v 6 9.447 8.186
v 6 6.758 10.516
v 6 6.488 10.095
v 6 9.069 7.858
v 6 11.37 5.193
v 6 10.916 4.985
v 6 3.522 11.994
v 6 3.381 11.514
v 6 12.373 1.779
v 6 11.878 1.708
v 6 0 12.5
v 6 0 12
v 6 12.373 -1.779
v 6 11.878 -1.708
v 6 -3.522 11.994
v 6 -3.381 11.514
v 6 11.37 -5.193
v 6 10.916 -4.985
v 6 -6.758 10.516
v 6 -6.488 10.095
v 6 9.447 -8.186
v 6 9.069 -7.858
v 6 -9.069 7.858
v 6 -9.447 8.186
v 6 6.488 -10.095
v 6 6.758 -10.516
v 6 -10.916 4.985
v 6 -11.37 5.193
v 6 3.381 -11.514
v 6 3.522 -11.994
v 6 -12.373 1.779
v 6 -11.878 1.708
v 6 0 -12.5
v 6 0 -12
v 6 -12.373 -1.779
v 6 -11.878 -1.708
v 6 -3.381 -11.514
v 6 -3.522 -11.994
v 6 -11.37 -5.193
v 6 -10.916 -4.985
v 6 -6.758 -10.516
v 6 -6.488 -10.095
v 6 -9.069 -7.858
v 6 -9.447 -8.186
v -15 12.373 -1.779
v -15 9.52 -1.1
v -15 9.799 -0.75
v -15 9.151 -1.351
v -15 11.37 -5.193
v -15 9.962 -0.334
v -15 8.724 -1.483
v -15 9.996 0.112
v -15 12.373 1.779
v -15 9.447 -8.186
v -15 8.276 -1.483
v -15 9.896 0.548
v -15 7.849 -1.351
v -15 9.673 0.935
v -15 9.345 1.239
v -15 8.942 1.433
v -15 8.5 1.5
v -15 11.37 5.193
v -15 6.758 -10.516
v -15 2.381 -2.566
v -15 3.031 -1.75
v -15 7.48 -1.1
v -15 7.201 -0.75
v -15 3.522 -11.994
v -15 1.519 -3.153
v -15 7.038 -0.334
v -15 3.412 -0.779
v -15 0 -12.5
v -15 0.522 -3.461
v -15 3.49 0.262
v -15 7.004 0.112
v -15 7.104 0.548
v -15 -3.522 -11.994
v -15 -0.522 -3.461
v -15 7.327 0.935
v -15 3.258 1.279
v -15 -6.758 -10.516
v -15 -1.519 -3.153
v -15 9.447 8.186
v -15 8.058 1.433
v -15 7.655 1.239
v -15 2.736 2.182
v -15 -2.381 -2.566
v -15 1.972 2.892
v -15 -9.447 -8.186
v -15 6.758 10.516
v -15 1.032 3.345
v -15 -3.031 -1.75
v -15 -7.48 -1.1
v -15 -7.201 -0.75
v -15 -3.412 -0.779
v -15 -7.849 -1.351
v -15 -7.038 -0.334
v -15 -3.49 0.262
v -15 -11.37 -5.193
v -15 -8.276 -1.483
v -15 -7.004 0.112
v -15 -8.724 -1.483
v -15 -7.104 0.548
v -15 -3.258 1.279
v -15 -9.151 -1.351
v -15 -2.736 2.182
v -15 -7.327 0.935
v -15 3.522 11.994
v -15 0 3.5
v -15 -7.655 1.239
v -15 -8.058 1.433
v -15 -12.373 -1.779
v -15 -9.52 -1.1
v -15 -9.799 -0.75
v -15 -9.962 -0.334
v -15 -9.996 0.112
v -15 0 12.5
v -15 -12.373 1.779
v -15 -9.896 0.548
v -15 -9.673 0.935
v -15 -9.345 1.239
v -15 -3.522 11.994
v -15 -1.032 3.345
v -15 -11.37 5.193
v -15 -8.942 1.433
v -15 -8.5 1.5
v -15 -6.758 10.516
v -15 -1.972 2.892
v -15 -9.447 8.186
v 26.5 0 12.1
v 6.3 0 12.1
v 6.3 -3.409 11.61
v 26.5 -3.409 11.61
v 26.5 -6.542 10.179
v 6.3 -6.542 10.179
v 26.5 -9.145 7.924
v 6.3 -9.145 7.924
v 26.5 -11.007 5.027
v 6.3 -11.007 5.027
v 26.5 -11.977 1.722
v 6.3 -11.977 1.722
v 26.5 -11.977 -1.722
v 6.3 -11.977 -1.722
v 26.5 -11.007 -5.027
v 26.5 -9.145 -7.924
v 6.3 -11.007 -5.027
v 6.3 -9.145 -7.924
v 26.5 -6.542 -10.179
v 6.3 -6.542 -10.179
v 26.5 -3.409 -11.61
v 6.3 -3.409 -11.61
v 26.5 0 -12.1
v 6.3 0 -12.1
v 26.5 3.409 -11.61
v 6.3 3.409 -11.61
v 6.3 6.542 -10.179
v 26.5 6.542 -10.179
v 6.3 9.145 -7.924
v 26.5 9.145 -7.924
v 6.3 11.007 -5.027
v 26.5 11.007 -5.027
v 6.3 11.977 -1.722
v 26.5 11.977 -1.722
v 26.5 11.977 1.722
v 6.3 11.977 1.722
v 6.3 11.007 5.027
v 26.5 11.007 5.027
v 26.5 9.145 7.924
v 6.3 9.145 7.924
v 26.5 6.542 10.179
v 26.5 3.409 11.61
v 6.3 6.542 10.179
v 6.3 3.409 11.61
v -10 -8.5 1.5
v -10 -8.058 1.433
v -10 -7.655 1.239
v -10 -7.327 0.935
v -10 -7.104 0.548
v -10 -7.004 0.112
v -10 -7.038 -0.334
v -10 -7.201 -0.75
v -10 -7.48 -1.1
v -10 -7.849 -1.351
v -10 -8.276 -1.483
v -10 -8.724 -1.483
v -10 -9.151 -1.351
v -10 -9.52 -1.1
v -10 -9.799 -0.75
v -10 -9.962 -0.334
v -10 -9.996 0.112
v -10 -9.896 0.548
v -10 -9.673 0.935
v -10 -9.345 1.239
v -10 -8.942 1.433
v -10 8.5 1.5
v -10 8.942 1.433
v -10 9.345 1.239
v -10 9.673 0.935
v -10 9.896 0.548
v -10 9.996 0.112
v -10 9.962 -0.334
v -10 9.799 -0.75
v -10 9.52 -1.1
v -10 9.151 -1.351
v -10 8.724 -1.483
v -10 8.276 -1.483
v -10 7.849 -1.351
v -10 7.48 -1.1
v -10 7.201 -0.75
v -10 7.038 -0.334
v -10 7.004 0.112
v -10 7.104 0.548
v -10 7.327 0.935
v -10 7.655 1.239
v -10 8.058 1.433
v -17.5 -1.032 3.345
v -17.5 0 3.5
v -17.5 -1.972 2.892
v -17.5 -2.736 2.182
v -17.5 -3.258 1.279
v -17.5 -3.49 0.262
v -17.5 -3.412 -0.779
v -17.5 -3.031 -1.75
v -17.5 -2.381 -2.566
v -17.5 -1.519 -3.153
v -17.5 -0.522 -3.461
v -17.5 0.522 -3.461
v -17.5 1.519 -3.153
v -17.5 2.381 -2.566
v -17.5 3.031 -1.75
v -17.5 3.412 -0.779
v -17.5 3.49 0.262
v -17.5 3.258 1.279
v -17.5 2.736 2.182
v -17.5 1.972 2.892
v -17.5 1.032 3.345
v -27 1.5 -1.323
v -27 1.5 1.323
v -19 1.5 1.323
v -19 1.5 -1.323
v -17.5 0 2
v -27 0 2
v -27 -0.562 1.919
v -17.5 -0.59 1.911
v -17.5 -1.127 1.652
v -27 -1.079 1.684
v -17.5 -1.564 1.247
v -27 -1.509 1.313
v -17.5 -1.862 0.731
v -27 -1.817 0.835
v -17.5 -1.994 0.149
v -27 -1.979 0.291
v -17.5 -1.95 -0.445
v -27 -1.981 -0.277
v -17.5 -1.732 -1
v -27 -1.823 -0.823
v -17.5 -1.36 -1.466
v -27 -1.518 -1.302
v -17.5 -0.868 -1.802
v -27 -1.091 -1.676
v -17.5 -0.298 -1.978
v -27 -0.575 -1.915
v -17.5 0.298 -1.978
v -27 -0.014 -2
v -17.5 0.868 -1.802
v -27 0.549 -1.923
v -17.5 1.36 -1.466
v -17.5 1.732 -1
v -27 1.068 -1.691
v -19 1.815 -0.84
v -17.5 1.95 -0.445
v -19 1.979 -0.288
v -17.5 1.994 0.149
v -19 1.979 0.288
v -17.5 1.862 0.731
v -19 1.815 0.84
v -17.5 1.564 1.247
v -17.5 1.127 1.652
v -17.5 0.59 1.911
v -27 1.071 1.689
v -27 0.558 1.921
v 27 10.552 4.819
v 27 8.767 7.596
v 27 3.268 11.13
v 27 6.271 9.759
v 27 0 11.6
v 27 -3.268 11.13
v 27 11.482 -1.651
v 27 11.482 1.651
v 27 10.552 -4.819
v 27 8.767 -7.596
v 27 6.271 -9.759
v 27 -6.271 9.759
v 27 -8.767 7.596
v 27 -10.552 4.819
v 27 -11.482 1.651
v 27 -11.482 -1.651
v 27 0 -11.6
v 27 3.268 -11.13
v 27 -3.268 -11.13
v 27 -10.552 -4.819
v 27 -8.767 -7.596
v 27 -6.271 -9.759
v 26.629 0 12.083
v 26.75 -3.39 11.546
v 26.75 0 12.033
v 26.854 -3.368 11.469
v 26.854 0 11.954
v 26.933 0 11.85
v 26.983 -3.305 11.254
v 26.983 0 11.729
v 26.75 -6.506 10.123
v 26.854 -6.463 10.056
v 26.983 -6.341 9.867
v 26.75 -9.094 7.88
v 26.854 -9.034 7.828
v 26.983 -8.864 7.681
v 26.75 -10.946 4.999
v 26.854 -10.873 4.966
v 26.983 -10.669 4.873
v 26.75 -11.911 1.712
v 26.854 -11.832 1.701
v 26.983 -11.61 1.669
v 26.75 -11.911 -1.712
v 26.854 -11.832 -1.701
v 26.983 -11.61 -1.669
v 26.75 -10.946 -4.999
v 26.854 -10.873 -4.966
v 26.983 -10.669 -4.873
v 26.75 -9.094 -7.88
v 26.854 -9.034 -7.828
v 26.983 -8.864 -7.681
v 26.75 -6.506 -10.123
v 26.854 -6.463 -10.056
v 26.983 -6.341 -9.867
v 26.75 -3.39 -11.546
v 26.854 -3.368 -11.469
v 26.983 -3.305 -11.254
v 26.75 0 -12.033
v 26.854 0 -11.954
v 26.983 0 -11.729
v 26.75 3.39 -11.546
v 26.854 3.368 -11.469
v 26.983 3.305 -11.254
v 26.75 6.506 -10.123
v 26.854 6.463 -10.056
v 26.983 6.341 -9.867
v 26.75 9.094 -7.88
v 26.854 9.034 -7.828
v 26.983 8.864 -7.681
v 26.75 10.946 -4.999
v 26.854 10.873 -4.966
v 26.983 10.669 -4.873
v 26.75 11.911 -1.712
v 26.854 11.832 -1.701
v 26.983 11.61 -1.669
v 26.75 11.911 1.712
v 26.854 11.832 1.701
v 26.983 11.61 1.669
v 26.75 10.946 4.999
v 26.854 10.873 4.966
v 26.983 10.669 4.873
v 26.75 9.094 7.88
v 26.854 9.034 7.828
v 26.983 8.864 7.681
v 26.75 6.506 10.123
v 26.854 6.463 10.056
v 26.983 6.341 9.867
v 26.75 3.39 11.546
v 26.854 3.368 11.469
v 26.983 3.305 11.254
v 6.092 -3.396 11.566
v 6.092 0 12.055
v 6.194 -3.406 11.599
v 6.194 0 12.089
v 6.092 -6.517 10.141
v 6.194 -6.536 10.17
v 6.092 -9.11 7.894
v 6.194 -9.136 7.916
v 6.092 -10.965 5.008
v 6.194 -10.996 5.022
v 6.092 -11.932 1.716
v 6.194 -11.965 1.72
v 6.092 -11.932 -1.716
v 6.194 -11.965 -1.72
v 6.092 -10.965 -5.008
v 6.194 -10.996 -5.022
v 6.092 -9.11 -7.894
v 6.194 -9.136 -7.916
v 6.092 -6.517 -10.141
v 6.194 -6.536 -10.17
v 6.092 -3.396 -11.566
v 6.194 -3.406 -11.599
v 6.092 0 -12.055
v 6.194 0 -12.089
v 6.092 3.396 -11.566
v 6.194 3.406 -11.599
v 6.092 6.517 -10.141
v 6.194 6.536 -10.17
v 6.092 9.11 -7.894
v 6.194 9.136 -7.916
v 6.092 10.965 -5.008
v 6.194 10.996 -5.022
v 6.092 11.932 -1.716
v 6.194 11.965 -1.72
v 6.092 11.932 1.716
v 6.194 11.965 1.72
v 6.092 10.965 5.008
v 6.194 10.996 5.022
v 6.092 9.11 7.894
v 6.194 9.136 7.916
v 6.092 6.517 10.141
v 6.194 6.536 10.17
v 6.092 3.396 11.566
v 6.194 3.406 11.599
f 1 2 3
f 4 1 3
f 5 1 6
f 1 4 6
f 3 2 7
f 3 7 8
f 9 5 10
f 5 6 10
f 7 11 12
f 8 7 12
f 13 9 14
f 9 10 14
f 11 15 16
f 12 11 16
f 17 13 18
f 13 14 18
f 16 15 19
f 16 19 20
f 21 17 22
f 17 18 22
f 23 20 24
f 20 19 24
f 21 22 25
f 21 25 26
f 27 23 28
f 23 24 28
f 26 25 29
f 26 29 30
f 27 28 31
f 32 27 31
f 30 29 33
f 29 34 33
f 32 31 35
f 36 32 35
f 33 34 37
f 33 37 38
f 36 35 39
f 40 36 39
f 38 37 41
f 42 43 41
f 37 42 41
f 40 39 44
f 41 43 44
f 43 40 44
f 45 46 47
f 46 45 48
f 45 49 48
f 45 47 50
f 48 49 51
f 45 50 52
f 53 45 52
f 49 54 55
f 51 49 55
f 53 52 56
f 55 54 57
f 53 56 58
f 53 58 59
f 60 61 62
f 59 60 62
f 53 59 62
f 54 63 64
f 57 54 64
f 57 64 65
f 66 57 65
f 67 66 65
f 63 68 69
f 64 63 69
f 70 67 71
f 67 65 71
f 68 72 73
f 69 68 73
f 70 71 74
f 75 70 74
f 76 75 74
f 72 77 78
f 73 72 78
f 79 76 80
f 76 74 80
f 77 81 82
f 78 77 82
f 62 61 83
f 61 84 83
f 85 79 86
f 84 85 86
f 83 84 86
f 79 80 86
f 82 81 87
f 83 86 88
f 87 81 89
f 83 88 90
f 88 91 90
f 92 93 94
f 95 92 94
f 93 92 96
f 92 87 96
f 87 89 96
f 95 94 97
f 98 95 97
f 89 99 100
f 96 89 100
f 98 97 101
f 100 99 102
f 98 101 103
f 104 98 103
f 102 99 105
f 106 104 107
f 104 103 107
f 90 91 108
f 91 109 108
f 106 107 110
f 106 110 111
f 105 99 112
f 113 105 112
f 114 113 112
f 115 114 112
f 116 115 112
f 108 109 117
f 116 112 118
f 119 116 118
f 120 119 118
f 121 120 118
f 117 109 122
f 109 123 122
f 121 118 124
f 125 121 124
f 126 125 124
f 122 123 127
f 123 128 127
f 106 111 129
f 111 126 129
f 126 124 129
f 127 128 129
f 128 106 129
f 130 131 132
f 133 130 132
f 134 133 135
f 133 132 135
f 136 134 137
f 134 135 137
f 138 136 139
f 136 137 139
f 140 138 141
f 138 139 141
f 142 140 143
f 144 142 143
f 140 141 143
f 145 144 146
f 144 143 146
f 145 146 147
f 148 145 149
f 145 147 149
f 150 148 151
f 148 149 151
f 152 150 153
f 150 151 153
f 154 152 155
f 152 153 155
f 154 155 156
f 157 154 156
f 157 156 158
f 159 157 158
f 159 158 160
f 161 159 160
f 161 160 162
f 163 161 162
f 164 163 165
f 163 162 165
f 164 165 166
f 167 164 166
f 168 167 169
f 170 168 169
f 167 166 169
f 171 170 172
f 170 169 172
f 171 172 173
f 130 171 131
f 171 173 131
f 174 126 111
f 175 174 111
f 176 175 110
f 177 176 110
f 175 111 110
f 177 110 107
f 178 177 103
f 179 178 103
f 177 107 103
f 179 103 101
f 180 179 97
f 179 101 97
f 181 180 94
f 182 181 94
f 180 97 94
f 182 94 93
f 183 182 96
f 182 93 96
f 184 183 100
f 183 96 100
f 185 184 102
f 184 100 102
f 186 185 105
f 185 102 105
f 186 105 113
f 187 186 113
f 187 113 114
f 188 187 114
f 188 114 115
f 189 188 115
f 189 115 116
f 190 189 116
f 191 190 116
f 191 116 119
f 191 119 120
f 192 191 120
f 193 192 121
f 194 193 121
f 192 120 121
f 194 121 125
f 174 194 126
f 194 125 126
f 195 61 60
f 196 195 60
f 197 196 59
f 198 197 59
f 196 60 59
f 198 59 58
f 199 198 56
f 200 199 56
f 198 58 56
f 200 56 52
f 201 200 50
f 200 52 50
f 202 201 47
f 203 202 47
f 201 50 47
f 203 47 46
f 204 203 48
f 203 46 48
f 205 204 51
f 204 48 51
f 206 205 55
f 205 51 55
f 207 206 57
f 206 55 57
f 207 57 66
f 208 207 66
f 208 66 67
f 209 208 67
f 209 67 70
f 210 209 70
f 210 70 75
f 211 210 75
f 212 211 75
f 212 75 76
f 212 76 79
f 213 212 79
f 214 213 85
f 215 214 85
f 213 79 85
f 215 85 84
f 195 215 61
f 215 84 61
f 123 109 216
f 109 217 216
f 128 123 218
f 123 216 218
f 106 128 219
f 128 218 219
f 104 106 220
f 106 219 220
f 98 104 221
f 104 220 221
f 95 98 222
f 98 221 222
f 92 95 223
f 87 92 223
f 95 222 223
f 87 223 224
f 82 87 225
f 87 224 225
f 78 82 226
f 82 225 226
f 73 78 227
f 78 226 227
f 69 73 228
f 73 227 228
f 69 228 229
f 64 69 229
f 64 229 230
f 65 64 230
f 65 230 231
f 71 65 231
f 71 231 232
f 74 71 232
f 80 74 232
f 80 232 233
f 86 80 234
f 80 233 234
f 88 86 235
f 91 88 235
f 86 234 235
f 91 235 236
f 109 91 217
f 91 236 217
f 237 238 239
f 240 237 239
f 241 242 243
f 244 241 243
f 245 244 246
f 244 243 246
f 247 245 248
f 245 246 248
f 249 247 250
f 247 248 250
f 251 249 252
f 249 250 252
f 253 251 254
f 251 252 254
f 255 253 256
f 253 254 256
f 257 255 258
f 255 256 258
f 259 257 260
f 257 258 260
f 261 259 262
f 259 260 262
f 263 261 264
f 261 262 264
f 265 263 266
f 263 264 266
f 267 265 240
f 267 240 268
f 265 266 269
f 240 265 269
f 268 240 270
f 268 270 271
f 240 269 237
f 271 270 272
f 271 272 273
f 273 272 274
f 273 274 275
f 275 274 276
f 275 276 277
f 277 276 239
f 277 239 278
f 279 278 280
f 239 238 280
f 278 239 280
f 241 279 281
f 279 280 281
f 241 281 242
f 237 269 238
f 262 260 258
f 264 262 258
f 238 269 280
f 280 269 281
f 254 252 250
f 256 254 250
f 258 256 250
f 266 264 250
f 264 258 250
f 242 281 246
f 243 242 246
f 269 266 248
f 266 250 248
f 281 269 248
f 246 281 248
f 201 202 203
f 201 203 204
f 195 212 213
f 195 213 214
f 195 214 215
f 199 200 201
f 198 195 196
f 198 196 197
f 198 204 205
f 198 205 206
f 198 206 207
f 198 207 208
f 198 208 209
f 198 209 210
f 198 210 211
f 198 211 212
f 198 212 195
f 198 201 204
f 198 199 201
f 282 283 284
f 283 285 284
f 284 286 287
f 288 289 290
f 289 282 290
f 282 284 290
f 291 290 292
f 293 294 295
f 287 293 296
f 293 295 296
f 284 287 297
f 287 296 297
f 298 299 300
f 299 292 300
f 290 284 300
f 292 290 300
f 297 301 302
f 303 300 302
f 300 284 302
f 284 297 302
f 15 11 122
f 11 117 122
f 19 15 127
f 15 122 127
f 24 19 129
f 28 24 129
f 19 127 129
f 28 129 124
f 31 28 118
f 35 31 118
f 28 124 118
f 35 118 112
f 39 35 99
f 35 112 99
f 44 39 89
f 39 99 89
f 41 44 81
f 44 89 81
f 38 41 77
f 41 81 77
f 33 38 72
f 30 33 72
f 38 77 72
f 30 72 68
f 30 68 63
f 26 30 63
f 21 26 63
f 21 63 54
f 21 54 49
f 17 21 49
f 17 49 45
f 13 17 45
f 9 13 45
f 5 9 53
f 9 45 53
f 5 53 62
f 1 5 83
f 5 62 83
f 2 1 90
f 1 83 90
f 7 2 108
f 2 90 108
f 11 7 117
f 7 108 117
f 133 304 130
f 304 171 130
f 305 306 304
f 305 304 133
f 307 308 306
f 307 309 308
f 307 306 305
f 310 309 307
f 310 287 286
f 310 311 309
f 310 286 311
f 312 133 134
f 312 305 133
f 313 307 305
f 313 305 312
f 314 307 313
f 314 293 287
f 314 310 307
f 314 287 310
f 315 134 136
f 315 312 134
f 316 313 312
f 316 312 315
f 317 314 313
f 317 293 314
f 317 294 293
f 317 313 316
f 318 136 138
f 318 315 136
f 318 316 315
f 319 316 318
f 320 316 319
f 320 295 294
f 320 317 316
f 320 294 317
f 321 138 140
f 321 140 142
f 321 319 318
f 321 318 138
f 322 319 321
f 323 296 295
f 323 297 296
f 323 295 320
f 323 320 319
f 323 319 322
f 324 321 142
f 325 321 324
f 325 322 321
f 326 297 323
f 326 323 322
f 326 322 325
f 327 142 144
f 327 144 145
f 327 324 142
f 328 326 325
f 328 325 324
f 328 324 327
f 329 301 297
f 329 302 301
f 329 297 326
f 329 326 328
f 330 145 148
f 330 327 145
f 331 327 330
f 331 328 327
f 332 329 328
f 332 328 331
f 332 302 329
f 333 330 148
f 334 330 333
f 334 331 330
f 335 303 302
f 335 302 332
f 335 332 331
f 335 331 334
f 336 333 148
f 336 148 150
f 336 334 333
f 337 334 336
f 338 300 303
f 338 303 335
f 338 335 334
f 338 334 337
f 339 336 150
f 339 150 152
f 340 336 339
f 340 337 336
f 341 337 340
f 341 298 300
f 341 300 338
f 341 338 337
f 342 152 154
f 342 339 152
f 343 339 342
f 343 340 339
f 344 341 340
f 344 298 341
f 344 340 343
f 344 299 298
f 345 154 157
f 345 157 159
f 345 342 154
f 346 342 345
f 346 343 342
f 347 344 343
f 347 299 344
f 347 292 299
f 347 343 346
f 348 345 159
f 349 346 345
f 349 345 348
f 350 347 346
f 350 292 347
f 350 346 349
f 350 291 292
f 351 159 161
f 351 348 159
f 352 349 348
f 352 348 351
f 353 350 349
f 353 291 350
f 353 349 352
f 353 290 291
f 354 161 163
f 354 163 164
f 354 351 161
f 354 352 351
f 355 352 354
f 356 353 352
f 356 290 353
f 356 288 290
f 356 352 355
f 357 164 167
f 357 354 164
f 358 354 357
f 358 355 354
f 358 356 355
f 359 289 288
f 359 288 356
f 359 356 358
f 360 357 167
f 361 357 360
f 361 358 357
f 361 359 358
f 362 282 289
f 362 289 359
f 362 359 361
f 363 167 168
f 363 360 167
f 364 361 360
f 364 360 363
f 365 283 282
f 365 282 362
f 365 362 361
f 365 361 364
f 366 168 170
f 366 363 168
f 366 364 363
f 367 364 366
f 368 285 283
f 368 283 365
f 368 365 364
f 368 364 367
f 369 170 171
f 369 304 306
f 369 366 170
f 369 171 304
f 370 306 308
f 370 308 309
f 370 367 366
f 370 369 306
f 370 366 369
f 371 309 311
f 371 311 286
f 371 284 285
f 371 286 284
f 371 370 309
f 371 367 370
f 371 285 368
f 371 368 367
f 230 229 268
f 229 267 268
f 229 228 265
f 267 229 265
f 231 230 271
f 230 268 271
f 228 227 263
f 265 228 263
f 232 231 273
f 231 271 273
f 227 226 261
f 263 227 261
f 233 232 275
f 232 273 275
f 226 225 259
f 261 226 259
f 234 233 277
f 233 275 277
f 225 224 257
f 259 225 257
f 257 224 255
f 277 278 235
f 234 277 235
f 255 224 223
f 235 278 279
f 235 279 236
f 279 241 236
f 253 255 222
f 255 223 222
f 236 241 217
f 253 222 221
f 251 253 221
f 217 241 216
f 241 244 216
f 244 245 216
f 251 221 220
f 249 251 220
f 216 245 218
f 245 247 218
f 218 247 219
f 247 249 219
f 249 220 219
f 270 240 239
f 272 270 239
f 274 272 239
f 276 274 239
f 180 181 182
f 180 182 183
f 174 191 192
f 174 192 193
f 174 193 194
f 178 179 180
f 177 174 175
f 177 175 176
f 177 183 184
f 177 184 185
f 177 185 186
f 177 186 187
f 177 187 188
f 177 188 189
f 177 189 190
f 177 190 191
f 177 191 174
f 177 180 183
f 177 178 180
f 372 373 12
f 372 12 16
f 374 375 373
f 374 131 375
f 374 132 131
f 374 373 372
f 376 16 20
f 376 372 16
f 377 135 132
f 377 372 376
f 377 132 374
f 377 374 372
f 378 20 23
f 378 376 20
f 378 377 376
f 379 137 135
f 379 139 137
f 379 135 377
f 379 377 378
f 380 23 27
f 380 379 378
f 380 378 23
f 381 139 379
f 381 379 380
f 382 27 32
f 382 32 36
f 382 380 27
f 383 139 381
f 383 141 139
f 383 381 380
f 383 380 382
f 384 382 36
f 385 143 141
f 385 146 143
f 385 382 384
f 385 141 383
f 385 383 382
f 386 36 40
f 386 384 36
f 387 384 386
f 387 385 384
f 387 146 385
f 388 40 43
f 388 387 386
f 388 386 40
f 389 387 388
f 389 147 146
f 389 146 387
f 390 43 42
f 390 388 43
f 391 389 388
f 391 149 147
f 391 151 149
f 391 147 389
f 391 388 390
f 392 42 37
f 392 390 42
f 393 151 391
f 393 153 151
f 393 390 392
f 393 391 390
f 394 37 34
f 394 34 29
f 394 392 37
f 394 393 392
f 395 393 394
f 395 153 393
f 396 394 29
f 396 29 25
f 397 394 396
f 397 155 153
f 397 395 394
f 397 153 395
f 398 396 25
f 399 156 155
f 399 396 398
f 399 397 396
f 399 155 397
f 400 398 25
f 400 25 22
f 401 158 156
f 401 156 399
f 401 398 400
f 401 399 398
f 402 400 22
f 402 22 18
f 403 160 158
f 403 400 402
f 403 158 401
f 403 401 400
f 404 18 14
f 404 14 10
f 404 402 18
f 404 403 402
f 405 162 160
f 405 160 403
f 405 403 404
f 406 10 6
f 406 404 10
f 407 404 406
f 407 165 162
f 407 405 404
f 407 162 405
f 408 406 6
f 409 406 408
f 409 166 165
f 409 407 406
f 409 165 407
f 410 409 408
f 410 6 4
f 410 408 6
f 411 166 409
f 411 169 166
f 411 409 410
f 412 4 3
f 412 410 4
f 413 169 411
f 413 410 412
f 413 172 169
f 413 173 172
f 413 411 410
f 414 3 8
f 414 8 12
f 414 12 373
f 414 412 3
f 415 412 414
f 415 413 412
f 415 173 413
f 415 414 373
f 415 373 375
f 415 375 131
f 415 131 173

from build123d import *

# Parameters (mm, degrees)
FILLET1_R          = 0.5
SKETCH2_W          = 8
SKETCH2_H          = 0.5
CUT_EXTRUDE1_DEPTH = 5
SKETCH3_R          = 1.5
CUT_EXTRUDE2_DEPTH = 5


with BuildPart() as part:
    # Sketch1 → Revolve1 (revolve)
    with BuildSketch(Plane.XY, mode=Mode.PRIVATE) as revolve1_sk:
        Polygon((-27, 0), (27, 0), (27, 12.1), (6.1, 12.1), (6, 12), (6, 12.5), (-15, 12.5), (-15, 3.5), (-17.5, 3.5), (-17.5, 2), (-27, 2), align=None)
    revolve(revolve1_sk.sketch.rotate(Axis((-27, 0, 0), (1, 0, 0)), 90), axis=Axis((-27, 0, 0), (1, 0, 0)))

    # Fillet1
    # the kernel refuses this fillet: 0.5 mm, written as the material it takes off along each edge
    with BuildSketch(Plane(origin=(27, 0, 0), x_dir=(0, 0, 1), z_dir=(0, 1, 0))) as fillet1_piece_1:
        with BuildLine():
            CenterArc((12.1 - FILLET1_R, -FILLET1_R), FILLET1_R, 0, 90)
            Line((12.1, -FILLET1_R), (12.1 + FILLET1_R * 0.02, -FILLET1_R))
            Line((12.1 + FILLET1_R * 0.02, -FILLET1_R), (12.1 + FILLET1_R * 0.02, FILLET1_R * 0.02))
            Line((12.1 + FILLET1_R * 0.02, FILLET1_R * 0.02), (12.1 - FILLET1_R, FILLET1_R * 0.02))
            Line((12.1 - FILLET1_R, FILLET1_R * 0.02), (12.1 - FILLET1_R, 0))
        make_face()
    revolve(axis=Axis((27, 0, 0), (1, 0, 0)), mode=Mode.SUBTRACT)
    with BuildSketch(Plane(origin=(6.1, 0, 0), x_dir=(0, 0, 1), z_dir=(0, 1, 0))) as fillet1_piece_2_section:
        with BuildLine():
            CenterArc((11.6, 0.2), FILLET1_R, 323.130102354, 36.869897646)
            Line((12, -0.1), (12.008, -0.106))
            ThreePointArc((12.008, -0.106), (12.057071068, -0.057071068), (12.107071068, -0.007071068))
            Line((12.107071068, -0.007071068), (12.11, 0))
            Line((12.11, 0), (12.11, 0.2))
            Line((12.11, 0.2), (12.1, 0.2))
        make_face()
    fillet1_piece_2 = revolve(axis=Axis((6.1, 0, 0), (1, 0, 0)), mode=Mode.PRIVATE)
    fillet1_piece_2 = split(fillet1_piece_2, bisect_by=Plane(origin=(6, 0, -12.082361586), z_dir=(1, 0, 0)), keep=Keep.TOP, mode=Mode.PRIVATE)
    add(fillet1_piece_2, mode=Mode.SUBTRACT)

    # Sketch2 → Cut-Extrude1 (cut, symmetric)
    with BuildSketch(Plane.XY):
        with Locations((-23, 1.75)):
            Rectangle(SKETCH2_W, SKETCH2_H)
    extrude(amount=CUT_EXTRUDE1_DEPTH, both=True, mode=Mode.SUBTRACT)

    # Sketch3 → Cut-Extrude2 (cut)
    with BuildSketch(Plane.ZY.offset(15)):
        with Locations((0, 8.5)):
            Circle(SKETCH3_R)
        with Locations((0, -8.5)):
            Circle(SKETCH3_R)
    extrude(amount=-CUT_EXTRUDE2_DEPTH, mode=Mode.SUBTRACT)


solid = part.part
